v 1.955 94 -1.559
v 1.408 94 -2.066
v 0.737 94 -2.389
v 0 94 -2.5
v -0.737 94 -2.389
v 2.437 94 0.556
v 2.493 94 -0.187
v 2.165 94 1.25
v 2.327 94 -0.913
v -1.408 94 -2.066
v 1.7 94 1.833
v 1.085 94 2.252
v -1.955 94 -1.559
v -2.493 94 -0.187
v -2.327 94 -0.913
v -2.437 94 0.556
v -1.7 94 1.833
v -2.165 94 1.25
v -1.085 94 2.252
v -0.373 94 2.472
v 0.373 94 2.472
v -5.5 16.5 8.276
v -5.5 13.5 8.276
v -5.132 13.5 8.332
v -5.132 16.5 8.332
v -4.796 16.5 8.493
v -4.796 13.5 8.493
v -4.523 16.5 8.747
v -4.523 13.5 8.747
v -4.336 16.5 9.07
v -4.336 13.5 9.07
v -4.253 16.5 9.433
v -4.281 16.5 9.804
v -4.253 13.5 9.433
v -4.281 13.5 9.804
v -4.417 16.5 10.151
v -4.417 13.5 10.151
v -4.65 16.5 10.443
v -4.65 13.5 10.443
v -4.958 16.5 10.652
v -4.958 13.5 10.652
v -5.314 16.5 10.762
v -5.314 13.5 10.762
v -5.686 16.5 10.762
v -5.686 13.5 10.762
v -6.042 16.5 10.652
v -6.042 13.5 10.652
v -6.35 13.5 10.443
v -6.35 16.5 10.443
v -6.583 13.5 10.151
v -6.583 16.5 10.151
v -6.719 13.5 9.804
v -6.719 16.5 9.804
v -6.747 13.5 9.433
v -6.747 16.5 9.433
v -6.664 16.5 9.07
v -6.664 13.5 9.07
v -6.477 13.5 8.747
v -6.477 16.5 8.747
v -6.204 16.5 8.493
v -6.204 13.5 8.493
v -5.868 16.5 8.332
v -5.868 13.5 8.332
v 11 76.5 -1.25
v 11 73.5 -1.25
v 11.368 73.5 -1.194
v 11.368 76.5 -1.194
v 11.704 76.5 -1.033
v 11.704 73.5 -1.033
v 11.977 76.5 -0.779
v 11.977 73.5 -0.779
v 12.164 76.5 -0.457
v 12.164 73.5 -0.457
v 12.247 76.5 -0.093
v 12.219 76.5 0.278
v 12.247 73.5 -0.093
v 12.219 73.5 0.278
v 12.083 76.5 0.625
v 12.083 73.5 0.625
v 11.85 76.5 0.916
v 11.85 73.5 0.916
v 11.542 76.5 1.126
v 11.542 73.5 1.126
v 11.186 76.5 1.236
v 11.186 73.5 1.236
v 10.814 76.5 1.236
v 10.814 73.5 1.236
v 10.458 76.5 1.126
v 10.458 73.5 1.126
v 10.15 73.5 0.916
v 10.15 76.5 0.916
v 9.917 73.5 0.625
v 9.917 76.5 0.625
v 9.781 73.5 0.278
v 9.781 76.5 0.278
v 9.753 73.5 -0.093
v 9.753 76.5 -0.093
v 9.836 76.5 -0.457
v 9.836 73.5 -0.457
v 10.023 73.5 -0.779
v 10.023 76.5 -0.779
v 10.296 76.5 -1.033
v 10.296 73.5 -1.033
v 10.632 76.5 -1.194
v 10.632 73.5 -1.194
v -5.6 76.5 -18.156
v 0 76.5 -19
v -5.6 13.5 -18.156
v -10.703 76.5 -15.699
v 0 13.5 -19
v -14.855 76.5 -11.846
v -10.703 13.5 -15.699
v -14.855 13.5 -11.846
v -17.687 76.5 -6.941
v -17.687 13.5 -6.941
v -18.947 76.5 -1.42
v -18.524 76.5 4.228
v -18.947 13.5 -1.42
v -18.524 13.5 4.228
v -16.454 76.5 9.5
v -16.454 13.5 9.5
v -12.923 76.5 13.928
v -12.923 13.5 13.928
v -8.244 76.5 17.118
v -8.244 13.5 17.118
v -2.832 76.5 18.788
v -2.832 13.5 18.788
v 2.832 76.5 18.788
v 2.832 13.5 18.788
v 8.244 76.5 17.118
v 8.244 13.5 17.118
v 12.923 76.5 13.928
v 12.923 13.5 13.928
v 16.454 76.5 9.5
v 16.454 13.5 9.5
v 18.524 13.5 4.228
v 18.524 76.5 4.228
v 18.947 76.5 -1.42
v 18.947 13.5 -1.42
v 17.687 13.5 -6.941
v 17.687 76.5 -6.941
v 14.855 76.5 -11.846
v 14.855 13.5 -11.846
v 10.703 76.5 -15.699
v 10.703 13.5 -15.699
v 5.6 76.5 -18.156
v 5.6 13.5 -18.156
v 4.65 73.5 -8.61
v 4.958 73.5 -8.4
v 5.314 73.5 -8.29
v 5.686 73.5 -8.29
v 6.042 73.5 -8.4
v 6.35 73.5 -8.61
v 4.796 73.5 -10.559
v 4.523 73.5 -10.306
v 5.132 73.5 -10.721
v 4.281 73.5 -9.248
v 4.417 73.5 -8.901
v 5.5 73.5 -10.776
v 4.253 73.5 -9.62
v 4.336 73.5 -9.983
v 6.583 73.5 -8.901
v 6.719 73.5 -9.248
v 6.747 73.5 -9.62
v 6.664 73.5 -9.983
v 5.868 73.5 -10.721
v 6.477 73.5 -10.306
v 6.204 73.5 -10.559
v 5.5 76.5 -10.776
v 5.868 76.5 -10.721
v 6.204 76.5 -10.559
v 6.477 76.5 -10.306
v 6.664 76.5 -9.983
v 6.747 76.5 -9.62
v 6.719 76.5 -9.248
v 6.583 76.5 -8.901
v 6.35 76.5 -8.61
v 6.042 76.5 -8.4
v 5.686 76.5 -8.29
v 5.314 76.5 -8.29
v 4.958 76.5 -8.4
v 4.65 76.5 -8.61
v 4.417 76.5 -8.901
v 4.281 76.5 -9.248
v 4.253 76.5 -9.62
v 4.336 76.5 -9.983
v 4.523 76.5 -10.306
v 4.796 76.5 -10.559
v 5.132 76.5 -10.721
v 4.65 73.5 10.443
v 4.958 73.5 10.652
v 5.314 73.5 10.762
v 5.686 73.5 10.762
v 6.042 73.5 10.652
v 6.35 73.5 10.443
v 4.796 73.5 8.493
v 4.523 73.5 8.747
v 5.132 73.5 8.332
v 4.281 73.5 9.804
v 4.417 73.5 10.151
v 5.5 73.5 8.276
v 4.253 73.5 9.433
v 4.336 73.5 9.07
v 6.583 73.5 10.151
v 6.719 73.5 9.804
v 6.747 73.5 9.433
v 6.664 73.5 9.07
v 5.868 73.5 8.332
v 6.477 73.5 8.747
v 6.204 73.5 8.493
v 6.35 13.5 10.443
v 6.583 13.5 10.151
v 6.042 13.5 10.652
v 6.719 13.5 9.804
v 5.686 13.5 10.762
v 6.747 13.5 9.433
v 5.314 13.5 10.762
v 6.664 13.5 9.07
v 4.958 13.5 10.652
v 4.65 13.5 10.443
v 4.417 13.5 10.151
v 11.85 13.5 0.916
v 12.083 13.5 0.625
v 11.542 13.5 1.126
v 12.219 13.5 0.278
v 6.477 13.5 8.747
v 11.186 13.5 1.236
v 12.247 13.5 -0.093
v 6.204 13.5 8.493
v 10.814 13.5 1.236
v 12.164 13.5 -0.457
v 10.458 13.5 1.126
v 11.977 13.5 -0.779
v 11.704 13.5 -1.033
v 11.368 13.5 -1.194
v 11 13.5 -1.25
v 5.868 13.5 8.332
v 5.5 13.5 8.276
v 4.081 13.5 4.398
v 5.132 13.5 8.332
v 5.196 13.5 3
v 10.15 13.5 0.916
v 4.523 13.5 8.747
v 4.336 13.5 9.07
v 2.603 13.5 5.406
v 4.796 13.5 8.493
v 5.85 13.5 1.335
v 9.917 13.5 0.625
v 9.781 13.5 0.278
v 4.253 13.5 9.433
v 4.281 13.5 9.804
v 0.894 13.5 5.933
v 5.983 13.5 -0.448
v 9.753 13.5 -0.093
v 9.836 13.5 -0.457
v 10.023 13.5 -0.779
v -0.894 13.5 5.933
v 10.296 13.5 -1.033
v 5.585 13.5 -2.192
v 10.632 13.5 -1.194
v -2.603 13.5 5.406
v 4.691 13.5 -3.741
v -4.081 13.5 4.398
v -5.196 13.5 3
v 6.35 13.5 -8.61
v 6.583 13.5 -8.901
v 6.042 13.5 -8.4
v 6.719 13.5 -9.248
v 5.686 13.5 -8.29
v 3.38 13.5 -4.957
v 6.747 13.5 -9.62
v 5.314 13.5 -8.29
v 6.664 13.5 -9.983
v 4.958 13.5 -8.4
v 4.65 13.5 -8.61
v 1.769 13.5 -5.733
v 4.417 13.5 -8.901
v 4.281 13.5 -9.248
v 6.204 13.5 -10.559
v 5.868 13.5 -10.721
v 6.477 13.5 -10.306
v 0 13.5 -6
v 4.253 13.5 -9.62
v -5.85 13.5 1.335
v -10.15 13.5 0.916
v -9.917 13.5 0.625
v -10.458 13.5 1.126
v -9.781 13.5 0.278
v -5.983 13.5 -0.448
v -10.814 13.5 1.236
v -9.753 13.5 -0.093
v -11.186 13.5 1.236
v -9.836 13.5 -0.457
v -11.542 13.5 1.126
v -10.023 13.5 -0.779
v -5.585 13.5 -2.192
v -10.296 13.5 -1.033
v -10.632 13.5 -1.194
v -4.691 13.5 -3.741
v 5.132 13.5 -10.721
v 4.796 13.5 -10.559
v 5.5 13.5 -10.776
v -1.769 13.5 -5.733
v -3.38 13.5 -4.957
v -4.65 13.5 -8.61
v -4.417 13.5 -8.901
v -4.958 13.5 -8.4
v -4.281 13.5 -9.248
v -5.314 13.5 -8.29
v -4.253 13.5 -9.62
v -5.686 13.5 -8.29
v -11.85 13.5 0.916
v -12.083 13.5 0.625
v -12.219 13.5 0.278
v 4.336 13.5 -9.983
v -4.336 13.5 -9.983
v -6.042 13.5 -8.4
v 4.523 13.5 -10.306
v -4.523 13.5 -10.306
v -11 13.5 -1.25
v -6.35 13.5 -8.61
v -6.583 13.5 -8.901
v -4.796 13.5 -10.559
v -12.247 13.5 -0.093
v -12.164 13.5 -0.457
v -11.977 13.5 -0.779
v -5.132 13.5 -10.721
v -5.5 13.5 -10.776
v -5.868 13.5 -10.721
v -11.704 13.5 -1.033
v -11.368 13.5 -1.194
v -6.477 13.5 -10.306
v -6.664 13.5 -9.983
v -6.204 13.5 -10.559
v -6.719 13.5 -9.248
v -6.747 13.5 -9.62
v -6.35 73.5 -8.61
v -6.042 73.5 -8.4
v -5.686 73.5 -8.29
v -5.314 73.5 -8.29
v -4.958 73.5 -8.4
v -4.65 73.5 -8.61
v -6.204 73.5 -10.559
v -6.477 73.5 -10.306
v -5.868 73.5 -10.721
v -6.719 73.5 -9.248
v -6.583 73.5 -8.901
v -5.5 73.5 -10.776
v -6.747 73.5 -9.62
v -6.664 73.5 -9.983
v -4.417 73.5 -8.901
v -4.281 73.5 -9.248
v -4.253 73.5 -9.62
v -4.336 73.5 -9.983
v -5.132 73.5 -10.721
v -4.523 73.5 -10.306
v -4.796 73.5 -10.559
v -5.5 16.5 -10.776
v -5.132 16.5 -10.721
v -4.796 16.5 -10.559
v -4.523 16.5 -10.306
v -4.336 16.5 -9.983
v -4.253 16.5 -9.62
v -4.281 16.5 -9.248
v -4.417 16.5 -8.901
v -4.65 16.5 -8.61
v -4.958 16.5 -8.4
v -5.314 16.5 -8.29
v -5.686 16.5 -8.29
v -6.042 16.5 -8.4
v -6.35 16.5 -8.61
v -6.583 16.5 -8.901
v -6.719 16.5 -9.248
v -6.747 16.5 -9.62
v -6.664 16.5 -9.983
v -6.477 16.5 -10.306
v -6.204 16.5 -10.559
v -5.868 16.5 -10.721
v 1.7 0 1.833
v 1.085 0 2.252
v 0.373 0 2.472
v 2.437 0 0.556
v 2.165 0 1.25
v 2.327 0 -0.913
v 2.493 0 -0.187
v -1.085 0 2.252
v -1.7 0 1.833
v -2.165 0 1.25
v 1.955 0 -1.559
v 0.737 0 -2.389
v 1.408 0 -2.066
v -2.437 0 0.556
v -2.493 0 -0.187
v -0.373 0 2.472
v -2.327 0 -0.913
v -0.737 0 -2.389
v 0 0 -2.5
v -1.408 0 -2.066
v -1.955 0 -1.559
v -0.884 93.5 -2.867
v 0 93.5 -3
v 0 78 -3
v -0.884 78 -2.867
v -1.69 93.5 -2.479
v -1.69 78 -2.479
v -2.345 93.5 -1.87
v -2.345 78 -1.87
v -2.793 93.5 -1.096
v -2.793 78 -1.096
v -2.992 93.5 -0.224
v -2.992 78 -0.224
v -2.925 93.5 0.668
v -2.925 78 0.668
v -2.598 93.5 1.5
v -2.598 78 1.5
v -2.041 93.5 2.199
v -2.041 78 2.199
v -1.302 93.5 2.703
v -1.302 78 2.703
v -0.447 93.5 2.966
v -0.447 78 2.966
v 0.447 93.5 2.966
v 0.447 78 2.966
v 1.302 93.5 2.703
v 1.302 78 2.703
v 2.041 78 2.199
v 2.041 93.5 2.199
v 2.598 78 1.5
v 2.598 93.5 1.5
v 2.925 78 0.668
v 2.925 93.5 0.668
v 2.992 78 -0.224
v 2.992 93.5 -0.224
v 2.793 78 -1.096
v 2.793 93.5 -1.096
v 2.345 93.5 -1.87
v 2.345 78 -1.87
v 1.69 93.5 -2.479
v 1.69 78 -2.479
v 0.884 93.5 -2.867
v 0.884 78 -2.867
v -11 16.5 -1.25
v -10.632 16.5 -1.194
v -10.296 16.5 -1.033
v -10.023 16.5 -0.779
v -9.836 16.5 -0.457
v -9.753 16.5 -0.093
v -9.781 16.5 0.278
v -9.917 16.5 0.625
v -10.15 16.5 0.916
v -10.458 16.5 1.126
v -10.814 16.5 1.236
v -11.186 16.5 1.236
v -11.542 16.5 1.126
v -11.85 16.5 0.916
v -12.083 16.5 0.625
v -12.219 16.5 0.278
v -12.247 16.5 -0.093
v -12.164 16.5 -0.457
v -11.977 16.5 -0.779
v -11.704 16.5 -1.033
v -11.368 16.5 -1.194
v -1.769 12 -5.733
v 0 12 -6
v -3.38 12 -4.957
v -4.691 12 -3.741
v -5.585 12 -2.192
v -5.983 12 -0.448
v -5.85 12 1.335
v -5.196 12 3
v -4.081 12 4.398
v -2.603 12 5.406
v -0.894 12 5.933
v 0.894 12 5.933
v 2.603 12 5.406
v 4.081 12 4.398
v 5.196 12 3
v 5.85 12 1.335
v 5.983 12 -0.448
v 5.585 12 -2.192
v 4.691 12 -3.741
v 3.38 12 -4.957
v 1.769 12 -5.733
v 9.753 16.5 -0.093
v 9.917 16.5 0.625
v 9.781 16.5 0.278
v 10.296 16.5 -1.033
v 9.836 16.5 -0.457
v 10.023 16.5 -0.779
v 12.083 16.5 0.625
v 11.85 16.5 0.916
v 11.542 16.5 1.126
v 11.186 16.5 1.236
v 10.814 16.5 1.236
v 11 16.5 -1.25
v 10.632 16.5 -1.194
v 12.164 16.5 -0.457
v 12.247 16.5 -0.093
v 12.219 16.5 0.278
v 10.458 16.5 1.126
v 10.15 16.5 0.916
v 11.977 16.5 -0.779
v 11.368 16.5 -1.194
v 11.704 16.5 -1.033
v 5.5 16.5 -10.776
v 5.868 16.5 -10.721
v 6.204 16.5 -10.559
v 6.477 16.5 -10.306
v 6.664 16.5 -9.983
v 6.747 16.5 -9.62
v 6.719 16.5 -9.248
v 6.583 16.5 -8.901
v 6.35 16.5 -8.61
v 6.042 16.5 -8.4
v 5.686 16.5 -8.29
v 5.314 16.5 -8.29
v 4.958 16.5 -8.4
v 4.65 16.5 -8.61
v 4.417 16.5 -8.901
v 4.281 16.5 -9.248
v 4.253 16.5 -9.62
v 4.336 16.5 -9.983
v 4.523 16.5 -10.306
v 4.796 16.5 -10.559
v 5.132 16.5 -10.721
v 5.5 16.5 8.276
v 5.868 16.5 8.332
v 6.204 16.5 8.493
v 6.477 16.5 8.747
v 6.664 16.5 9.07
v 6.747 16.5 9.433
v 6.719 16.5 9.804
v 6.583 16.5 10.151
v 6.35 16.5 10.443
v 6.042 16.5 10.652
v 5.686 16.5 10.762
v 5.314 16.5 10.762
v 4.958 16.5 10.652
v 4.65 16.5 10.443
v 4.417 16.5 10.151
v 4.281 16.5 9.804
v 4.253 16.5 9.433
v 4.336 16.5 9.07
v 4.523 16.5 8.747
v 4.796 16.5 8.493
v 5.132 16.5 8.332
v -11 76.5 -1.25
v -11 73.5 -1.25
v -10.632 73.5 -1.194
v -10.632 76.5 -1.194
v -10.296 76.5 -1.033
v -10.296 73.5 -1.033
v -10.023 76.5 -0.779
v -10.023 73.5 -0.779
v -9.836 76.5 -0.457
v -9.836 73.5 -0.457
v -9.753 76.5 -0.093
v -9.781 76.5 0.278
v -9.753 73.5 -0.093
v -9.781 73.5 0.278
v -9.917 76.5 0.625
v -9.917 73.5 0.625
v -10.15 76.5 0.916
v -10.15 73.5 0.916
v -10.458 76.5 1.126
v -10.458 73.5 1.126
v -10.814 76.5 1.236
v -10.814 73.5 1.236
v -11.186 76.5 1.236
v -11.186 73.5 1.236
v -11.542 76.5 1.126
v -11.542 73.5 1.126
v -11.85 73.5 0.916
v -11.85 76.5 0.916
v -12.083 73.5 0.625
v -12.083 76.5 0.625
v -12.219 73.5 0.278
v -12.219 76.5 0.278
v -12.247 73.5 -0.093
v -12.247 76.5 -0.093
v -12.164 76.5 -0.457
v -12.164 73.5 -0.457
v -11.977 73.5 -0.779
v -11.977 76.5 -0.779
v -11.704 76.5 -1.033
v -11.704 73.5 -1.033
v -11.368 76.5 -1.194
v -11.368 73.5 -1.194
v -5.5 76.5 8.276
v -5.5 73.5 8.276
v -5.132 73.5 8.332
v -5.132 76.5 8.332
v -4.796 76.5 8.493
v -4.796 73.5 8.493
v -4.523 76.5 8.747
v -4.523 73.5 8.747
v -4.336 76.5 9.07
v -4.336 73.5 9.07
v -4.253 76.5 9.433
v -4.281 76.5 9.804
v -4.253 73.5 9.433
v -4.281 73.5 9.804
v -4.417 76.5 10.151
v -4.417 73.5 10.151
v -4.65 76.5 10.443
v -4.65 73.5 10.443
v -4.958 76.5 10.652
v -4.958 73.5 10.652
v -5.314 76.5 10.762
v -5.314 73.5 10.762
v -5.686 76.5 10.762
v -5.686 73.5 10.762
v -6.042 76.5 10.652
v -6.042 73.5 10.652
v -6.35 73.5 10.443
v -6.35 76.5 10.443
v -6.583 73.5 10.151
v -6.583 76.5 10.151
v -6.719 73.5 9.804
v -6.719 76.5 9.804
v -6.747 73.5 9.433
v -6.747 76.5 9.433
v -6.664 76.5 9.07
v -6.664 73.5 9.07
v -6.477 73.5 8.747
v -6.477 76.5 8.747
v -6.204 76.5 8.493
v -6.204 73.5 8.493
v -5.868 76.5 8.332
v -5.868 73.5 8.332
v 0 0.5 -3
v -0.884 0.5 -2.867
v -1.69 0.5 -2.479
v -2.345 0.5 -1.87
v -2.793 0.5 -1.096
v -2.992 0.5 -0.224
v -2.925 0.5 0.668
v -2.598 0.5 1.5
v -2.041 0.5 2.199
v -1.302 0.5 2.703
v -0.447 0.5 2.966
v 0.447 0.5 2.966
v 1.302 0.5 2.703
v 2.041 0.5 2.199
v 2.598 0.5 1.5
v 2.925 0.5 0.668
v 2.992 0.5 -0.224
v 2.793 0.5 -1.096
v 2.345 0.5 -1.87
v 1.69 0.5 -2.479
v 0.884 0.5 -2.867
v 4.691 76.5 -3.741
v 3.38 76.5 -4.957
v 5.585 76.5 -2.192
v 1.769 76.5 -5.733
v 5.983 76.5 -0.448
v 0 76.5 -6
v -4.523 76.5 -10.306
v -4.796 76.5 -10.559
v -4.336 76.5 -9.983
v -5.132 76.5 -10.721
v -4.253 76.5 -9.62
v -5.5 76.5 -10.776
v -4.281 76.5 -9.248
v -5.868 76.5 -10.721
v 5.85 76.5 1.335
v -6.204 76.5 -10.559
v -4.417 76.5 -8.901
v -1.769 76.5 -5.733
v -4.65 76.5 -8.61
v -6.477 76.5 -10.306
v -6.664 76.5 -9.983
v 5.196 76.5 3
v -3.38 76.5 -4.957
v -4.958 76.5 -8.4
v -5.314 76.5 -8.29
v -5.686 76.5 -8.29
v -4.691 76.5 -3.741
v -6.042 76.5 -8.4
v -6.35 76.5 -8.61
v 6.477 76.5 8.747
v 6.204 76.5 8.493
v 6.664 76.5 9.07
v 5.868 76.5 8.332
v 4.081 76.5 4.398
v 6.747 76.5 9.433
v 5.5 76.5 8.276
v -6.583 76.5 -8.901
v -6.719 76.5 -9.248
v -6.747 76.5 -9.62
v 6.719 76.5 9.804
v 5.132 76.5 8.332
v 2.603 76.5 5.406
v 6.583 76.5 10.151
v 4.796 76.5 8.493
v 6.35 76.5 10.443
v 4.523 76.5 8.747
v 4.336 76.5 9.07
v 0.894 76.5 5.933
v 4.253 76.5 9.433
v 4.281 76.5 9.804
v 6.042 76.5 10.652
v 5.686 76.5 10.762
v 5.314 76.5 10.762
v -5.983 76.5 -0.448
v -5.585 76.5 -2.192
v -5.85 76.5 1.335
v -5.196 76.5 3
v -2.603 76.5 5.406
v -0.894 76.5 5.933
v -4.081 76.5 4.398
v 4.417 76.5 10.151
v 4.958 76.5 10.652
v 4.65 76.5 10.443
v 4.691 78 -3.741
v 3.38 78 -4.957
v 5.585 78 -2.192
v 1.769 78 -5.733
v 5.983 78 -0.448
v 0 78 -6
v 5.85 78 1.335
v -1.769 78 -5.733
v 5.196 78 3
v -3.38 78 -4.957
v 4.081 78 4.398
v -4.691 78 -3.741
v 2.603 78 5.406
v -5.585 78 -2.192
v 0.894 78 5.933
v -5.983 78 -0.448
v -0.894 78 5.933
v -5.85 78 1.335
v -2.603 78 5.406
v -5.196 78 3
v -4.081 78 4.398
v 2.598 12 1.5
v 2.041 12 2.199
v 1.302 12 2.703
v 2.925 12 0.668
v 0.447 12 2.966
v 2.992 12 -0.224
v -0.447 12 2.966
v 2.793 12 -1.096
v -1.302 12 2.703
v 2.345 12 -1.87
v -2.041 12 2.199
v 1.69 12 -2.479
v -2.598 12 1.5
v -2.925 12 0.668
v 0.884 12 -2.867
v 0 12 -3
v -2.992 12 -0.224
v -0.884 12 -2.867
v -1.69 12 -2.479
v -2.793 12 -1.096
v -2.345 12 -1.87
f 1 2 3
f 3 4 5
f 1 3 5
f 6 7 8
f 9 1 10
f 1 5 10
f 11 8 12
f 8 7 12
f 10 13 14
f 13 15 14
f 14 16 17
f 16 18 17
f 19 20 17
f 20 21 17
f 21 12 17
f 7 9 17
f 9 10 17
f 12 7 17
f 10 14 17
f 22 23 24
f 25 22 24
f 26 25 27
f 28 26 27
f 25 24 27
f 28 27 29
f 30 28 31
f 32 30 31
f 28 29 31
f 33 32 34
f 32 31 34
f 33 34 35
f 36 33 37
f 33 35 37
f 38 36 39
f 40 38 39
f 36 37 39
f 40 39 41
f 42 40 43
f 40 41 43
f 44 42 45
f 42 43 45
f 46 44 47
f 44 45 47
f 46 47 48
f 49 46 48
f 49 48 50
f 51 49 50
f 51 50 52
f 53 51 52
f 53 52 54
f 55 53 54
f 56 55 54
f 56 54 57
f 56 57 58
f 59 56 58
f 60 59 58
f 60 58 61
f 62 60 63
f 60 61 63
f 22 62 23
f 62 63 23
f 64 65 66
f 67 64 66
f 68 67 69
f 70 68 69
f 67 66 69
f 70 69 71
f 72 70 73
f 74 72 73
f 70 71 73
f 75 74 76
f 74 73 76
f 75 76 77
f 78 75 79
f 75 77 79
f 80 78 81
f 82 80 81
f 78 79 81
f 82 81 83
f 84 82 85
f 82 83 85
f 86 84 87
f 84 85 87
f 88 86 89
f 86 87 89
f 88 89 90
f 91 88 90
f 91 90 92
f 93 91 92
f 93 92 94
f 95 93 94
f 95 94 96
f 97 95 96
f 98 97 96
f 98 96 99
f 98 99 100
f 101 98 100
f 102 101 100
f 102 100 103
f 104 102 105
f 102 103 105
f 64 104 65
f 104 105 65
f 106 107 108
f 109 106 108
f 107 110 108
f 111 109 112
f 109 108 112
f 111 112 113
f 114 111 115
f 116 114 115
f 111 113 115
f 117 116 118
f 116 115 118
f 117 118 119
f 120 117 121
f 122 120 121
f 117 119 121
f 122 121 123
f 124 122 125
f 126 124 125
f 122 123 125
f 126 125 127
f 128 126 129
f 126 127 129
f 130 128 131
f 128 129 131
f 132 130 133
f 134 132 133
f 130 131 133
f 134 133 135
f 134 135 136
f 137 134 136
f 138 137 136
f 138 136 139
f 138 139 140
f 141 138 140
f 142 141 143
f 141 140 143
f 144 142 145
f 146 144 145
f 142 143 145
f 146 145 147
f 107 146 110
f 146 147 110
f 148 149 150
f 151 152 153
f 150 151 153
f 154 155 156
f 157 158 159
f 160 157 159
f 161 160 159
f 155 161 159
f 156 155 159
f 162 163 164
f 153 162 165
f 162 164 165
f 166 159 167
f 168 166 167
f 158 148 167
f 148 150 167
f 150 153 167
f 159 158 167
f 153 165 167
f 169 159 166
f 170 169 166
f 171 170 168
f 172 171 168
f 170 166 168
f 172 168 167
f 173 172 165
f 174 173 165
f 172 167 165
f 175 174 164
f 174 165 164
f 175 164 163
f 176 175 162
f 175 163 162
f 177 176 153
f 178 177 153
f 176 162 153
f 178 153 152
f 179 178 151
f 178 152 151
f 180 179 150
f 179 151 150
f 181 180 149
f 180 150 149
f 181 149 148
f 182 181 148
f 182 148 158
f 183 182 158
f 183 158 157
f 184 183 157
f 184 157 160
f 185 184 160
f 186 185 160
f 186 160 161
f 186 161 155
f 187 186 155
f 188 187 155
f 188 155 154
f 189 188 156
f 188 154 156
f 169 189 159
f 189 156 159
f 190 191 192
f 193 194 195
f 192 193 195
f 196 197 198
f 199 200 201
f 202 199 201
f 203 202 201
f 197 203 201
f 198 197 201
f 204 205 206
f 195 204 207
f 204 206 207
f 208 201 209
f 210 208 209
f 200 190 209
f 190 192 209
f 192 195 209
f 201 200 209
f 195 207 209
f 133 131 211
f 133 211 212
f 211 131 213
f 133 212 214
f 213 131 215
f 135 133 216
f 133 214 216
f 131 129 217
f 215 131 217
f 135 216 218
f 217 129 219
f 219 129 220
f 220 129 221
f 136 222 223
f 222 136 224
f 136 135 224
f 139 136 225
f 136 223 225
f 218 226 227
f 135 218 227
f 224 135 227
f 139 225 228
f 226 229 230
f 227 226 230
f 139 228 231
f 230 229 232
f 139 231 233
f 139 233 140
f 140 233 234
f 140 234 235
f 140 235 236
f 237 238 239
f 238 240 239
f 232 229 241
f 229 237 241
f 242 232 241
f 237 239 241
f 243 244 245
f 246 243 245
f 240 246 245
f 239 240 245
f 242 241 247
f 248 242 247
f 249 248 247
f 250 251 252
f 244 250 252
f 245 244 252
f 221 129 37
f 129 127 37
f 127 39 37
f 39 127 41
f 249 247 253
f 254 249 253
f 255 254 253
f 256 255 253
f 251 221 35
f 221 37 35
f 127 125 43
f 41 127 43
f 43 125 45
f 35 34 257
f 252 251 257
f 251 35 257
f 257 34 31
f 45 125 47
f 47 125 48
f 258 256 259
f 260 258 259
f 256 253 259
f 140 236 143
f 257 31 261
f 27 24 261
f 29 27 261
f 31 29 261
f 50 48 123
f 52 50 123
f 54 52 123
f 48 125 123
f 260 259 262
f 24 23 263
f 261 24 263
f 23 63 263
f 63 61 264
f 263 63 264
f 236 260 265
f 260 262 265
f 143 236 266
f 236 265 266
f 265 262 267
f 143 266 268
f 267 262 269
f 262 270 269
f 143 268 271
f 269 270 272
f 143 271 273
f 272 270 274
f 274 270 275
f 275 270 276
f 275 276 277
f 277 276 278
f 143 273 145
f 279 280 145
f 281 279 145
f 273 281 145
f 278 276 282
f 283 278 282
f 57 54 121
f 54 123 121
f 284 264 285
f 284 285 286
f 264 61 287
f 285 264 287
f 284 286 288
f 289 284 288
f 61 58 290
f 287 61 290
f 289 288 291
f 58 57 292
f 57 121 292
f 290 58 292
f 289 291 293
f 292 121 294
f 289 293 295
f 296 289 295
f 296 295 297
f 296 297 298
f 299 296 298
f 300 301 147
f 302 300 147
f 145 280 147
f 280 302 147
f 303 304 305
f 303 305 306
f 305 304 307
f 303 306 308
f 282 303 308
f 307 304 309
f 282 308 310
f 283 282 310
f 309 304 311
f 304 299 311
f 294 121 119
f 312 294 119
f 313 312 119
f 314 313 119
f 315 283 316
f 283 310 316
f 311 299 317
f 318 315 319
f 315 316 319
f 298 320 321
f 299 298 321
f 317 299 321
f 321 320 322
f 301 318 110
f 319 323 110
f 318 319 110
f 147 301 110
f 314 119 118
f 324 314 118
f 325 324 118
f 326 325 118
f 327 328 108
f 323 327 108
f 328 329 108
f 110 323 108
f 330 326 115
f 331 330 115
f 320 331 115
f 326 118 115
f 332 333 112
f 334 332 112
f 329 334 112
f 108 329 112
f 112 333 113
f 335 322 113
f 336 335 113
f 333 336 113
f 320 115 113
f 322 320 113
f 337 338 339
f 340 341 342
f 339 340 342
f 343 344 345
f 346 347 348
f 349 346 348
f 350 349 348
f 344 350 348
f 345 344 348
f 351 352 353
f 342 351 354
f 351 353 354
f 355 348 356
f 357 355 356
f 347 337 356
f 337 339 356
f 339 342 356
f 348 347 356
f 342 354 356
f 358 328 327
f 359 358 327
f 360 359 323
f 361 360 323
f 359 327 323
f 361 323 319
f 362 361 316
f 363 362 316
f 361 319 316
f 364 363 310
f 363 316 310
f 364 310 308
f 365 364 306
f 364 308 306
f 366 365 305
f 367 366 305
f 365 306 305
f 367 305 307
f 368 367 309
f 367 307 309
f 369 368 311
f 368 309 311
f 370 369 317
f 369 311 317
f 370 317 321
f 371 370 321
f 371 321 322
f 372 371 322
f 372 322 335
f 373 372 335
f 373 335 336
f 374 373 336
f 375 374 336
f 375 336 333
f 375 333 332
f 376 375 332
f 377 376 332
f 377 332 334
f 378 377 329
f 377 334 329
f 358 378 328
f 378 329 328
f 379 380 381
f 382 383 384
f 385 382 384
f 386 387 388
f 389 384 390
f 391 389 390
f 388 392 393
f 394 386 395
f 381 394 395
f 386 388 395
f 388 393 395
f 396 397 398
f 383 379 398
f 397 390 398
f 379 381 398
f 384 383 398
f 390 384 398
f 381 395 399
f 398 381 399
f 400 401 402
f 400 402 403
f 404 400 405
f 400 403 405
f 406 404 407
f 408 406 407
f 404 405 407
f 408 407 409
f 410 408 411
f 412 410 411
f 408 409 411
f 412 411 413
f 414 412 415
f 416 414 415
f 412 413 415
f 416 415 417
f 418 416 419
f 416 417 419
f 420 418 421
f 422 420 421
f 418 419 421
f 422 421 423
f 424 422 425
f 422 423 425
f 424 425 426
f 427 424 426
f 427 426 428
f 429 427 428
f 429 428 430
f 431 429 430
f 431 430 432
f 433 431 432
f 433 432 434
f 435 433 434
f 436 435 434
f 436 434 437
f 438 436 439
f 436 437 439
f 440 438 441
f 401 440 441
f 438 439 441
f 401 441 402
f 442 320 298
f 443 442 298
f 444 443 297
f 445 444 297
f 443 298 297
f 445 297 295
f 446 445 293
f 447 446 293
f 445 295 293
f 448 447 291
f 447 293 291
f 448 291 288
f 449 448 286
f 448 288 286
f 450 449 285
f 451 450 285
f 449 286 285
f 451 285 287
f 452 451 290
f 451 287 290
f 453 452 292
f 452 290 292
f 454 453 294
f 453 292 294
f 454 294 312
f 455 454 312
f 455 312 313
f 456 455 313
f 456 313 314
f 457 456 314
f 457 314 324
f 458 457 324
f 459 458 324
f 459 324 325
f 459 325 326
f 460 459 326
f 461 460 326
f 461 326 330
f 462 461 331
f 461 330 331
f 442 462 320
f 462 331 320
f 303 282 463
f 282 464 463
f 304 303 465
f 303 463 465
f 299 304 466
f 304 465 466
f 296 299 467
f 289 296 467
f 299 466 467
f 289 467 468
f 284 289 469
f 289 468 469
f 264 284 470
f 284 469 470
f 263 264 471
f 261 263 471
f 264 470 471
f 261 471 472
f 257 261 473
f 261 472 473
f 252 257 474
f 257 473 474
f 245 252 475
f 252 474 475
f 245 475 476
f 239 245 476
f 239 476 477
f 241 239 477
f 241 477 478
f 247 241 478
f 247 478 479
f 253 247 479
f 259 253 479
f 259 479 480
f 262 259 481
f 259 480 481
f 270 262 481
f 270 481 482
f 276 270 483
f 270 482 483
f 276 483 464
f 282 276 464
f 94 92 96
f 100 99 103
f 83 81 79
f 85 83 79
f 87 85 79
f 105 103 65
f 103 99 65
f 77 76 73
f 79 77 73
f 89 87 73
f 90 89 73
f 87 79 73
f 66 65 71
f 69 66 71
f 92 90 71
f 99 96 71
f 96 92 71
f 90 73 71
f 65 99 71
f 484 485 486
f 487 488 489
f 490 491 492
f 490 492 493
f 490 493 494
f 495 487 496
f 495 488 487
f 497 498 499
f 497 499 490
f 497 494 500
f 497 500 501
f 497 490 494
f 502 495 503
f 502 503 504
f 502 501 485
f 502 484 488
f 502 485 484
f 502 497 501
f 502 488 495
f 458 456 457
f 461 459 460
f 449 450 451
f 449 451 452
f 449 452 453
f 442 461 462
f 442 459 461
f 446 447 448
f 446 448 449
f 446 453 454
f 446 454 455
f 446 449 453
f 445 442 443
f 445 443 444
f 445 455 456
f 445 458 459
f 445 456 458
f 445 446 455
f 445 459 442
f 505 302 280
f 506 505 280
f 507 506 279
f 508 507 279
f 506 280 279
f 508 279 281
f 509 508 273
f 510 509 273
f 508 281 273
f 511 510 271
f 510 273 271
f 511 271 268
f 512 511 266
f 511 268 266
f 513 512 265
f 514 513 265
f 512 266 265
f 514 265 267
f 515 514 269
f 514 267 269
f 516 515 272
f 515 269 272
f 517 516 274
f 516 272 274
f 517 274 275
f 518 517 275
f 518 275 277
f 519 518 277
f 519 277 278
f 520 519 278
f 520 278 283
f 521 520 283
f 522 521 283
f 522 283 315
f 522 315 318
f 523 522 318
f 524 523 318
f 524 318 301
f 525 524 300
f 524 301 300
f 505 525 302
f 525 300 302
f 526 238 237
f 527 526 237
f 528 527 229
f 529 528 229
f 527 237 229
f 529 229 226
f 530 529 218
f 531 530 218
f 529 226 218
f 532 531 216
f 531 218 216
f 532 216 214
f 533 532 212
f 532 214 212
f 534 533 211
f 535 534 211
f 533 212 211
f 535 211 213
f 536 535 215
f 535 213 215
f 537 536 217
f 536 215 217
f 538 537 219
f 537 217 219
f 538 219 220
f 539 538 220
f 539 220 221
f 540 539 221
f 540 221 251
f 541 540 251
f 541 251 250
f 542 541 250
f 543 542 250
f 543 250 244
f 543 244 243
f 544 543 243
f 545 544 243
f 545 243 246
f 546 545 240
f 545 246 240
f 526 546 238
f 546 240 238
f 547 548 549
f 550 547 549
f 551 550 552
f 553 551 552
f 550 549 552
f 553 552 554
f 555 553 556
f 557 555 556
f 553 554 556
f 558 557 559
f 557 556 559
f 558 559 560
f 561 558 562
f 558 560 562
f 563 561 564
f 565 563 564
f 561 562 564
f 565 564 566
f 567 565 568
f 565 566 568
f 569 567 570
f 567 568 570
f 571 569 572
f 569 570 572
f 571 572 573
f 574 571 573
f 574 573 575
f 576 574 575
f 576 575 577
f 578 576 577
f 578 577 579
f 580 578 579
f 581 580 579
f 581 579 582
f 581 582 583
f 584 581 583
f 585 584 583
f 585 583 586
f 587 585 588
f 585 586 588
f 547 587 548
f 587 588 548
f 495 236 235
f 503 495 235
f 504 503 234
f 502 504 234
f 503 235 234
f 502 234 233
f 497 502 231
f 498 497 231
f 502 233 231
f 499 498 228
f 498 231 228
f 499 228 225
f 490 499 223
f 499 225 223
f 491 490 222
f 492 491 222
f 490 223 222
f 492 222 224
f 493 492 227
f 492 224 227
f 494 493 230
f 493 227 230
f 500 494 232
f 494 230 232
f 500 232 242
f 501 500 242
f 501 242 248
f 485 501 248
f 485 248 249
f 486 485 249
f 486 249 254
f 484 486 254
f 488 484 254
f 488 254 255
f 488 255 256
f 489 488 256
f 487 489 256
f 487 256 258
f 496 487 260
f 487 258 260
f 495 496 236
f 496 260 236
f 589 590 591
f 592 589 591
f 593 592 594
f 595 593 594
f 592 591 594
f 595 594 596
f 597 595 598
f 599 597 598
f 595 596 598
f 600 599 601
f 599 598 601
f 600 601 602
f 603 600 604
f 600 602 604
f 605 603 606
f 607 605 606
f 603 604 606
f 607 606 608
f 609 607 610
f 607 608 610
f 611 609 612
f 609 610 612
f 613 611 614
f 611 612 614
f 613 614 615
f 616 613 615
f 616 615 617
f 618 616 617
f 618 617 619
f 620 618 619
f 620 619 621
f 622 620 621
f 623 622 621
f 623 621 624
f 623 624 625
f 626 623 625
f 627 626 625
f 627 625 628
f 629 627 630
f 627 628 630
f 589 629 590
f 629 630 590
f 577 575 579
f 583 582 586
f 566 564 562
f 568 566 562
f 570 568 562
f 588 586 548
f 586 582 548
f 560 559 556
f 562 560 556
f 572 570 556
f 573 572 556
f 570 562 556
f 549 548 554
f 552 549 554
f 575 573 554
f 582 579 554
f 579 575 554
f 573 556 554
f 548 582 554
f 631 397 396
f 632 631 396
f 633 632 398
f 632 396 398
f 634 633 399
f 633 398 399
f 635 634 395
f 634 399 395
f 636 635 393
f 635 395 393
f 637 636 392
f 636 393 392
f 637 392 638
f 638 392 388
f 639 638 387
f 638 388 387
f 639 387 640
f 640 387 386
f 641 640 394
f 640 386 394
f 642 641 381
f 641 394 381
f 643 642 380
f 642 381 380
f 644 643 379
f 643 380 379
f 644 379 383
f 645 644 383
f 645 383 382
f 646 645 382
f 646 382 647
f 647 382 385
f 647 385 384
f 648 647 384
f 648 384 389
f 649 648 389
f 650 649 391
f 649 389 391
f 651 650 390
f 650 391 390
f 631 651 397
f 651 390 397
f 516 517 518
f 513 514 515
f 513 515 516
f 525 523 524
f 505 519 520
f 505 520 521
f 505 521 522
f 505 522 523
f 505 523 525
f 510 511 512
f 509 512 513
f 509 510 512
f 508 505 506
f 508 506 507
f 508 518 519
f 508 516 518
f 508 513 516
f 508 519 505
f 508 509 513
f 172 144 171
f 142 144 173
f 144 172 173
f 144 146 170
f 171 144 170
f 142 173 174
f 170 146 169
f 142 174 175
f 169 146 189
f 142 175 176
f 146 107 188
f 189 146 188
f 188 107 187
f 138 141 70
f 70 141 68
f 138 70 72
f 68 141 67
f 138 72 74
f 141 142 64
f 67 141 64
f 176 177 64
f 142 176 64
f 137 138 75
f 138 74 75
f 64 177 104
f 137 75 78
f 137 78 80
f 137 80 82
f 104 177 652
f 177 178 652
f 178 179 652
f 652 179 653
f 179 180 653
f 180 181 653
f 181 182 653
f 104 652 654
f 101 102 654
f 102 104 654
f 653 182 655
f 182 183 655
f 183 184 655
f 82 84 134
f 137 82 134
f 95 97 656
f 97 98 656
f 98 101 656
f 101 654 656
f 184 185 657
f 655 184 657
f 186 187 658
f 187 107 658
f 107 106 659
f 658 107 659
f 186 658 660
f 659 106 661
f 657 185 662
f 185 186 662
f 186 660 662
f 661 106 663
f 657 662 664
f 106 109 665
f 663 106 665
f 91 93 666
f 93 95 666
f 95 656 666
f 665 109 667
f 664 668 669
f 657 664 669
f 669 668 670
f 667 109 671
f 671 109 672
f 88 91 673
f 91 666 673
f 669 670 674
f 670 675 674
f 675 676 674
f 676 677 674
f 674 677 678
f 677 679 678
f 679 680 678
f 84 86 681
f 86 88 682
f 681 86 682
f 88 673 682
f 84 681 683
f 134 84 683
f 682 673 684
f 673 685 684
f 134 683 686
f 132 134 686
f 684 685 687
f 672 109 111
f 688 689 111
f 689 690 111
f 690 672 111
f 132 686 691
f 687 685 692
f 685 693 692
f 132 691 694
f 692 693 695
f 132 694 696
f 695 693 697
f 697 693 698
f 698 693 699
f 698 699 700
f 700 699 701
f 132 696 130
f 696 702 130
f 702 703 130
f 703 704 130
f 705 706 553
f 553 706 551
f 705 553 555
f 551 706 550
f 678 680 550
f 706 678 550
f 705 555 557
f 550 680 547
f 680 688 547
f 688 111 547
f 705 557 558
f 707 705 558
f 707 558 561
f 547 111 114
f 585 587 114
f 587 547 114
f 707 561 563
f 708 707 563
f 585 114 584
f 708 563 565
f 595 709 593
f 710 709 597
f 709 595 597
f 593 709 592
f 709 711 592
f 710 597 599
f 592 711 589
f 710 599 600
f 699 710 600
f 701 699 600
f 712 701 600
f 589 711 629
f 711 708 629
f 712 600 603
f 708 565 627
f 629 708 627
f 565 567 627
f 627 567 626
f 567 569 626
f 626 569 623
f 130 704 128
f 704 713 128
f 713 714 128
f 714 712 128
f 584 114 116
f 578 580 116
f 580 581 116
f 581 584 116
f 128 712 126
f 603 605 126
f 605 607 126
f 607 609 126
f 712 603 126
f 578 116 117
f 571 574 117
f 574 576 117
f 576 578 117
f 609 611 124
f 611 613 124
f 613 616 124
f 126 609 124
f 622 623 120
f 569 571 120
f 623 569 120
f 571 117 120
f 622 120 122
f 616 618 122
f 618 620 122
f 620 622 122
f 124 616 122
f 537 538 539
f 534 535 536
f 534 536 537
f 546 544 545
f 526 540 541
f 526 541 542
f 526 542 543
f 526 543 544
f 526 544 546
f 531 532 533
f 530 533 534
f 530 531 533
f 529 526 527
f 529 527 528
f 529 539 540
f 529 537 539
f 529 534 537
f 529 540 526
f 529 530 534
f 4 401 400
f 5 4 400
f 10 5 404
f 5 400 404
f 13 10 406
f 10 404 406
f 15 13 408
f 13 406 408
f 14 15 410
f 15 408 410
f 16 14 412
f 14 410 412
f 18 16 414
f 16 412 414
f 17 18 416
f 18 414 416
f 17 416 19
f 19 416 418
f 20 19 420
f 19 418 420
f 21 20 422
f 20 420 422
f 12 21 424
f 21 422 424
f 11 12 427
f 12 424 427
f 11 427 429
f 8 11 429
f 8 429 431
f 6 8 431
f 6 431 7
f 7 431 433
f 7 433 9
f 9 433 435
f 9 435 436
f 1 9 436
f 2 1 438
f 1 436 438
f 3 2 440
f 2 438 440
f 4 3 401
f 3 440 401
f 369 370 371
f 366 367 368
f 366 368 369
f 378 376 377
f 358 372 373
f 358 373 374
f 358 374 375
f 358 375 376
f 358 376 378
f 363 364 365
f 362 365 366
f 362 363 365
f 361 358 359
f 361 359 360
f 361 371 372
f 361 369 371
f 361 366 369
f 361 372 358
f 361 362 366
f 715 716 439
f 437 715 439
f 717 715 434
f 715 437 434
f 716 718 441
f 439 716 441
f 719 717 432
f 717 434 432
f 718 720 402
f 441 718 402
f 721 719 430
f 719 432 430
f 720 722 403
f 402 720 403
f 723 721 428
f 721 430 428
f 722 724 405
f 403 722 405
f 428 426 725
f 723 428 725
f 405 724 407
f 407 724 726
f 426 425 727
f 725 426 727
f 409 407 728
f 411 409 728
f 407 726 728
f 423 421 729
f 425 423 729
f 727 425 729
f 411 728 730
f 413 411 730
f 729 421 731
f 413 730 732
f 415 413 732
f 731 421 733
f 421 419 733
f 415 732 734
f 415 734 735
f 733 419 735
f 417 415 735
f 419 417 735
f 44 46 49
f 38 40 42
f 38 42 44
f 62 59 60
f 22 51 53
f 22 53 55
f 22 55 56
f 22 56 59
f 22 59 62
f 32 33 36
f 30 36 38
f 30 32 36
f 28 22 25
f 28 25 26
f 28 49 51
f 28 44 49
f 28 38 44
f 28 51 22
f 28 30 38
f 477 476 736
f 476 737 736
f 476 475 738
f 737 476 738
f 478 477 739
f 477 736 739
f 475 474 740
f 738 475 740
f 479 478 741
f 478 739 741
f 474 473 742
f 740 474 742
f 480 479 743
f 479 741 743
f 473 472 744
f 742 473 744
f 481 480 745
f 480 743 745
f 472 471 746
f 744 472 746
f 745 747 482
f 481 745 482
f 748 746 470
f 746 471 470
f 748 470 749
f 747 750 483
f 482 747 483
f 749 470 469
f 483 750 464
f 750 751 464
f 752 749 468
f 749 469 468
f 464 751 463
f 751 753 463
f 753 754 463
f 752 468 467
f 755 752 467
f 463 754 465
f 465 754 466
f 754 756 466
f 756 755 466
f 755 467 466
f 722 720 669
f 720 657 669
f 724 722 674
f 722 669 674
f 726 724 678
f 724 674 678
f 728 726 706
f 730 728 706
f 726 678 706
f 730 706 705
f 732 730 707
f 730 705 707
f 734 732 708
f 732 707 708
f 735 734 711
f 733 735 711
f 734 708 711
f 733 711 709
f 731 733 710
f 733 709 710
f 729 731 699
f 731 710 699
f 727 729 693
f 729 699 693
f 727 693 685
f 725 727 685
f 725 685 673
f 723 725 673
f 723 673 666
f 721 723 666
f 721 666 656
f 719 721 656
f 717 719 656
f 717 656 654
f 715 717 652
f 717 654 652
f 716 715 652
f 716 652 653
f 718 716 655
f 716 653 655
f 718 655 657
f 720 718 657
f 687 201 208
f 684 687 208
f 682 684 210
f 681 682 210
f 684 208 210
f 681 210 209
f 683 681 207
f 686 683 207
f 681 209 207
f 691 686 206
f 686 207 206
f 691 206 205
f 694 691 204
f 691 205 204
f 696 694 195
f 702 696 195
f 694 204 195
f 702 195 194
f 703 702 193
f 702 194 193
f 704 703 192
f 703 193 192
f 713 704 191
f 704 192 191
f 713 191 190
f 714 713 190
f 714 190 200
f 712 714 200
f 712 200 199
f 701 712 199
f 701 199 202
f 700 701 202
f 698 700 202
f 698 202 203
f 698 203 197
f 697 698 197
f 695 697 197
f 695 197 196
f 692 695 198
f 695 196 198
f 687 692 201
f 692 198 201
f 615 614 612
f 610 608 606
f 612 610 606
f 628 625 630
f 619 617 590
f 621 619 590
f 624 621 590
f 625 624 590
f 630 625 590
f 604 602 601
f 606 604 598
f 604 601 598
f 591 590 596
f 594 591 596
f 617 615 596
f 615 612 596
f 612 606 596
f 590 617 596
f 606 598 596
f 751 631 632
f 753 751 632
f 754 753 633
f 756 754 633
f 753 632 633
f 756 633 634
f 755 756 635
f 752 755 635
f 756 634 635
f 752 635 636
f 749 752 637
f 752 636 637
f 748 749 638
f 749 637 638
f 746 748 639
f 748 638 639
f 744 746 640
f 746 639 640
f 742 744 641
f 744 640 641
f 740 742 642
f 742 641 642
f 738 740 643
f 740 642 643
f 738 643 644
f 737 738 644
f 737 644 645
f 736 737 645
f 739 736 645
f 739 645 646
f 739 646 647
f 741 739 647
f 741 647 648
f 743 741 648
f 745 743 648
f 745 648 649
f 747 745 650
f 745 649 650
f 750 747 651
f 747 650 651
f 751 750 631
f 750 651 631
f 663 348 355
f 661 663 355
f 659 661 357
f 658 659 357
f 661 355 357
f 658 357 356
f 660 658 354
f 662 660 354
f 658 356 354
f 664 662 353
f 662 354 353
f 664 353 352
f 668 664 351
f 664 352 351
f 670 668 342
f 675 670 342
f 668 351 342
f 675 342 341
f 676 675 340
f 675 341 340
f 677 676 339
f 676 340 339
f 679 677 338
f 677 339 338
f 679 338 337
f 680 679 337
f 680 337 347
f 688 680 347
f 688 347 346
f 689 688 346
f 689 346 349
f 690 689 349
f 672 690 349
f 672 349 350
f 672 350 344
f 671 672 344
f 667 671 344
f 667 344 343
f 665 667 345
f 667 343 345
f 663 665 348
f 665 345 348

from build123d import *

# Parameters (mm, degrees)
ESQUISSE2_R             = 1.25
ENL_V_MAT_EXTRU_1_DEPTH = 3
ENL_V_START             = -60
ESQUISSE2_2_R           = 1.25
ENL_V_MAT_EXTRU_2_DEPTH = 3
CHANFREIN1_SIZE         = 0.5


with BuildPart() as part:
    # Esquisse1 → Révolution1 (revolve)
    with BuildSketch(Plane.XY, mode=Mode.PRIVATE) as r_volution1_sk:
        Polygon((0, 0), (0, 94), (3, 94), (3, 78), (6, 78), (6, 76.5), (19, 76.5), (19, 13.5), (6, 13.5), (6, 12), (3, 12), (3, 0), align=None)
    revolve(r_volution1_sk.sketch.rotate(Axis((0, 0, 0), (0, 1, 0)), 90), axis=Axis((0, 0, 0), (0, 1, 0)))

    # Esquisse2 → Enlèv. mat.-Extru.1 (cut)
    with BuildSketch(Plane.XZ.offset(-13.5)):
        with Locations(Location((11, 0, 0), (0, 0, 270))):
            Circle(ESQUISSE2_R)
        with Locations(Location((5.5, -9.526279442, 0), (0, 0, 270))):
            Circle(ESQUISSE2_R)
        with Locations(Location((-5.5, -9.526279442, 0), (0, 0, 270))):
            Circle(ESQUISSE2_R)
        with Locations(Location((-11, 0, 0), (0, 0, 270))):
            Circle(ESQUISSE2_R)
        with Locations(Location((-5.5, 9.526279442, 0), (0, 0, 270))):
            Circle(ESQUISSE2_R)
        with Locations(Location((5.5, 9.526279442, 0), (0, 0, 270))):
            Circle(ESQUISSE2_R)
    extrude(amount=-ENL_V_MAT_EXTRU_1_DEPTH, mode=Mode.SUBTRACT)

    # Esquisse2<2> → Enlèv. mat.-Extru.2 (cut)
    with BuildSketch(Plane.XZ.offset(-13.5).offset(ENL_V_START)):
        with Locations(Location((11, 0, 0), (0, 0, 270))):
            Circle(ESQUISSE2_2_R)
        with Locations(Location((5.5, -9.526279442, 0), (0, 0, 270))):
            Circle(ESQUISSE2_2_R)
        with Locations(Location((-5.5, -9.526279442, 0), (0, 0, 270))):
            Circle(ESQUISSE2_2_R)
        with Locations(Location((-11, 0, 0), (0, 0, 270))):
            Circle(ESQUISSE2_2_R)
        with Locations(Location((-5.5, 9.526279442, 0), (0, 0, 270))):
            Circle(ESQUISSE2_2_R)
        with Locations(Location((5.5, 9.526279442, 0), (0, 0, 270))):
            Circle(ESQUISSE2_2_R)
    extrude(amount=-ENL_V_MAT_EXTRU_2_DEPTH, mode=Mode.SUBTRACT)

    # Chanfrein1
    chanfrein1_edges = [part.edges().sort_by_distance(p)[0] for p in [
        (0, 94, 3),
        (0, 0, 3),
    ]]
    chamfer(chanfrein1_edges, length=CHANFREIN1_SIZE)


solid = part.part
